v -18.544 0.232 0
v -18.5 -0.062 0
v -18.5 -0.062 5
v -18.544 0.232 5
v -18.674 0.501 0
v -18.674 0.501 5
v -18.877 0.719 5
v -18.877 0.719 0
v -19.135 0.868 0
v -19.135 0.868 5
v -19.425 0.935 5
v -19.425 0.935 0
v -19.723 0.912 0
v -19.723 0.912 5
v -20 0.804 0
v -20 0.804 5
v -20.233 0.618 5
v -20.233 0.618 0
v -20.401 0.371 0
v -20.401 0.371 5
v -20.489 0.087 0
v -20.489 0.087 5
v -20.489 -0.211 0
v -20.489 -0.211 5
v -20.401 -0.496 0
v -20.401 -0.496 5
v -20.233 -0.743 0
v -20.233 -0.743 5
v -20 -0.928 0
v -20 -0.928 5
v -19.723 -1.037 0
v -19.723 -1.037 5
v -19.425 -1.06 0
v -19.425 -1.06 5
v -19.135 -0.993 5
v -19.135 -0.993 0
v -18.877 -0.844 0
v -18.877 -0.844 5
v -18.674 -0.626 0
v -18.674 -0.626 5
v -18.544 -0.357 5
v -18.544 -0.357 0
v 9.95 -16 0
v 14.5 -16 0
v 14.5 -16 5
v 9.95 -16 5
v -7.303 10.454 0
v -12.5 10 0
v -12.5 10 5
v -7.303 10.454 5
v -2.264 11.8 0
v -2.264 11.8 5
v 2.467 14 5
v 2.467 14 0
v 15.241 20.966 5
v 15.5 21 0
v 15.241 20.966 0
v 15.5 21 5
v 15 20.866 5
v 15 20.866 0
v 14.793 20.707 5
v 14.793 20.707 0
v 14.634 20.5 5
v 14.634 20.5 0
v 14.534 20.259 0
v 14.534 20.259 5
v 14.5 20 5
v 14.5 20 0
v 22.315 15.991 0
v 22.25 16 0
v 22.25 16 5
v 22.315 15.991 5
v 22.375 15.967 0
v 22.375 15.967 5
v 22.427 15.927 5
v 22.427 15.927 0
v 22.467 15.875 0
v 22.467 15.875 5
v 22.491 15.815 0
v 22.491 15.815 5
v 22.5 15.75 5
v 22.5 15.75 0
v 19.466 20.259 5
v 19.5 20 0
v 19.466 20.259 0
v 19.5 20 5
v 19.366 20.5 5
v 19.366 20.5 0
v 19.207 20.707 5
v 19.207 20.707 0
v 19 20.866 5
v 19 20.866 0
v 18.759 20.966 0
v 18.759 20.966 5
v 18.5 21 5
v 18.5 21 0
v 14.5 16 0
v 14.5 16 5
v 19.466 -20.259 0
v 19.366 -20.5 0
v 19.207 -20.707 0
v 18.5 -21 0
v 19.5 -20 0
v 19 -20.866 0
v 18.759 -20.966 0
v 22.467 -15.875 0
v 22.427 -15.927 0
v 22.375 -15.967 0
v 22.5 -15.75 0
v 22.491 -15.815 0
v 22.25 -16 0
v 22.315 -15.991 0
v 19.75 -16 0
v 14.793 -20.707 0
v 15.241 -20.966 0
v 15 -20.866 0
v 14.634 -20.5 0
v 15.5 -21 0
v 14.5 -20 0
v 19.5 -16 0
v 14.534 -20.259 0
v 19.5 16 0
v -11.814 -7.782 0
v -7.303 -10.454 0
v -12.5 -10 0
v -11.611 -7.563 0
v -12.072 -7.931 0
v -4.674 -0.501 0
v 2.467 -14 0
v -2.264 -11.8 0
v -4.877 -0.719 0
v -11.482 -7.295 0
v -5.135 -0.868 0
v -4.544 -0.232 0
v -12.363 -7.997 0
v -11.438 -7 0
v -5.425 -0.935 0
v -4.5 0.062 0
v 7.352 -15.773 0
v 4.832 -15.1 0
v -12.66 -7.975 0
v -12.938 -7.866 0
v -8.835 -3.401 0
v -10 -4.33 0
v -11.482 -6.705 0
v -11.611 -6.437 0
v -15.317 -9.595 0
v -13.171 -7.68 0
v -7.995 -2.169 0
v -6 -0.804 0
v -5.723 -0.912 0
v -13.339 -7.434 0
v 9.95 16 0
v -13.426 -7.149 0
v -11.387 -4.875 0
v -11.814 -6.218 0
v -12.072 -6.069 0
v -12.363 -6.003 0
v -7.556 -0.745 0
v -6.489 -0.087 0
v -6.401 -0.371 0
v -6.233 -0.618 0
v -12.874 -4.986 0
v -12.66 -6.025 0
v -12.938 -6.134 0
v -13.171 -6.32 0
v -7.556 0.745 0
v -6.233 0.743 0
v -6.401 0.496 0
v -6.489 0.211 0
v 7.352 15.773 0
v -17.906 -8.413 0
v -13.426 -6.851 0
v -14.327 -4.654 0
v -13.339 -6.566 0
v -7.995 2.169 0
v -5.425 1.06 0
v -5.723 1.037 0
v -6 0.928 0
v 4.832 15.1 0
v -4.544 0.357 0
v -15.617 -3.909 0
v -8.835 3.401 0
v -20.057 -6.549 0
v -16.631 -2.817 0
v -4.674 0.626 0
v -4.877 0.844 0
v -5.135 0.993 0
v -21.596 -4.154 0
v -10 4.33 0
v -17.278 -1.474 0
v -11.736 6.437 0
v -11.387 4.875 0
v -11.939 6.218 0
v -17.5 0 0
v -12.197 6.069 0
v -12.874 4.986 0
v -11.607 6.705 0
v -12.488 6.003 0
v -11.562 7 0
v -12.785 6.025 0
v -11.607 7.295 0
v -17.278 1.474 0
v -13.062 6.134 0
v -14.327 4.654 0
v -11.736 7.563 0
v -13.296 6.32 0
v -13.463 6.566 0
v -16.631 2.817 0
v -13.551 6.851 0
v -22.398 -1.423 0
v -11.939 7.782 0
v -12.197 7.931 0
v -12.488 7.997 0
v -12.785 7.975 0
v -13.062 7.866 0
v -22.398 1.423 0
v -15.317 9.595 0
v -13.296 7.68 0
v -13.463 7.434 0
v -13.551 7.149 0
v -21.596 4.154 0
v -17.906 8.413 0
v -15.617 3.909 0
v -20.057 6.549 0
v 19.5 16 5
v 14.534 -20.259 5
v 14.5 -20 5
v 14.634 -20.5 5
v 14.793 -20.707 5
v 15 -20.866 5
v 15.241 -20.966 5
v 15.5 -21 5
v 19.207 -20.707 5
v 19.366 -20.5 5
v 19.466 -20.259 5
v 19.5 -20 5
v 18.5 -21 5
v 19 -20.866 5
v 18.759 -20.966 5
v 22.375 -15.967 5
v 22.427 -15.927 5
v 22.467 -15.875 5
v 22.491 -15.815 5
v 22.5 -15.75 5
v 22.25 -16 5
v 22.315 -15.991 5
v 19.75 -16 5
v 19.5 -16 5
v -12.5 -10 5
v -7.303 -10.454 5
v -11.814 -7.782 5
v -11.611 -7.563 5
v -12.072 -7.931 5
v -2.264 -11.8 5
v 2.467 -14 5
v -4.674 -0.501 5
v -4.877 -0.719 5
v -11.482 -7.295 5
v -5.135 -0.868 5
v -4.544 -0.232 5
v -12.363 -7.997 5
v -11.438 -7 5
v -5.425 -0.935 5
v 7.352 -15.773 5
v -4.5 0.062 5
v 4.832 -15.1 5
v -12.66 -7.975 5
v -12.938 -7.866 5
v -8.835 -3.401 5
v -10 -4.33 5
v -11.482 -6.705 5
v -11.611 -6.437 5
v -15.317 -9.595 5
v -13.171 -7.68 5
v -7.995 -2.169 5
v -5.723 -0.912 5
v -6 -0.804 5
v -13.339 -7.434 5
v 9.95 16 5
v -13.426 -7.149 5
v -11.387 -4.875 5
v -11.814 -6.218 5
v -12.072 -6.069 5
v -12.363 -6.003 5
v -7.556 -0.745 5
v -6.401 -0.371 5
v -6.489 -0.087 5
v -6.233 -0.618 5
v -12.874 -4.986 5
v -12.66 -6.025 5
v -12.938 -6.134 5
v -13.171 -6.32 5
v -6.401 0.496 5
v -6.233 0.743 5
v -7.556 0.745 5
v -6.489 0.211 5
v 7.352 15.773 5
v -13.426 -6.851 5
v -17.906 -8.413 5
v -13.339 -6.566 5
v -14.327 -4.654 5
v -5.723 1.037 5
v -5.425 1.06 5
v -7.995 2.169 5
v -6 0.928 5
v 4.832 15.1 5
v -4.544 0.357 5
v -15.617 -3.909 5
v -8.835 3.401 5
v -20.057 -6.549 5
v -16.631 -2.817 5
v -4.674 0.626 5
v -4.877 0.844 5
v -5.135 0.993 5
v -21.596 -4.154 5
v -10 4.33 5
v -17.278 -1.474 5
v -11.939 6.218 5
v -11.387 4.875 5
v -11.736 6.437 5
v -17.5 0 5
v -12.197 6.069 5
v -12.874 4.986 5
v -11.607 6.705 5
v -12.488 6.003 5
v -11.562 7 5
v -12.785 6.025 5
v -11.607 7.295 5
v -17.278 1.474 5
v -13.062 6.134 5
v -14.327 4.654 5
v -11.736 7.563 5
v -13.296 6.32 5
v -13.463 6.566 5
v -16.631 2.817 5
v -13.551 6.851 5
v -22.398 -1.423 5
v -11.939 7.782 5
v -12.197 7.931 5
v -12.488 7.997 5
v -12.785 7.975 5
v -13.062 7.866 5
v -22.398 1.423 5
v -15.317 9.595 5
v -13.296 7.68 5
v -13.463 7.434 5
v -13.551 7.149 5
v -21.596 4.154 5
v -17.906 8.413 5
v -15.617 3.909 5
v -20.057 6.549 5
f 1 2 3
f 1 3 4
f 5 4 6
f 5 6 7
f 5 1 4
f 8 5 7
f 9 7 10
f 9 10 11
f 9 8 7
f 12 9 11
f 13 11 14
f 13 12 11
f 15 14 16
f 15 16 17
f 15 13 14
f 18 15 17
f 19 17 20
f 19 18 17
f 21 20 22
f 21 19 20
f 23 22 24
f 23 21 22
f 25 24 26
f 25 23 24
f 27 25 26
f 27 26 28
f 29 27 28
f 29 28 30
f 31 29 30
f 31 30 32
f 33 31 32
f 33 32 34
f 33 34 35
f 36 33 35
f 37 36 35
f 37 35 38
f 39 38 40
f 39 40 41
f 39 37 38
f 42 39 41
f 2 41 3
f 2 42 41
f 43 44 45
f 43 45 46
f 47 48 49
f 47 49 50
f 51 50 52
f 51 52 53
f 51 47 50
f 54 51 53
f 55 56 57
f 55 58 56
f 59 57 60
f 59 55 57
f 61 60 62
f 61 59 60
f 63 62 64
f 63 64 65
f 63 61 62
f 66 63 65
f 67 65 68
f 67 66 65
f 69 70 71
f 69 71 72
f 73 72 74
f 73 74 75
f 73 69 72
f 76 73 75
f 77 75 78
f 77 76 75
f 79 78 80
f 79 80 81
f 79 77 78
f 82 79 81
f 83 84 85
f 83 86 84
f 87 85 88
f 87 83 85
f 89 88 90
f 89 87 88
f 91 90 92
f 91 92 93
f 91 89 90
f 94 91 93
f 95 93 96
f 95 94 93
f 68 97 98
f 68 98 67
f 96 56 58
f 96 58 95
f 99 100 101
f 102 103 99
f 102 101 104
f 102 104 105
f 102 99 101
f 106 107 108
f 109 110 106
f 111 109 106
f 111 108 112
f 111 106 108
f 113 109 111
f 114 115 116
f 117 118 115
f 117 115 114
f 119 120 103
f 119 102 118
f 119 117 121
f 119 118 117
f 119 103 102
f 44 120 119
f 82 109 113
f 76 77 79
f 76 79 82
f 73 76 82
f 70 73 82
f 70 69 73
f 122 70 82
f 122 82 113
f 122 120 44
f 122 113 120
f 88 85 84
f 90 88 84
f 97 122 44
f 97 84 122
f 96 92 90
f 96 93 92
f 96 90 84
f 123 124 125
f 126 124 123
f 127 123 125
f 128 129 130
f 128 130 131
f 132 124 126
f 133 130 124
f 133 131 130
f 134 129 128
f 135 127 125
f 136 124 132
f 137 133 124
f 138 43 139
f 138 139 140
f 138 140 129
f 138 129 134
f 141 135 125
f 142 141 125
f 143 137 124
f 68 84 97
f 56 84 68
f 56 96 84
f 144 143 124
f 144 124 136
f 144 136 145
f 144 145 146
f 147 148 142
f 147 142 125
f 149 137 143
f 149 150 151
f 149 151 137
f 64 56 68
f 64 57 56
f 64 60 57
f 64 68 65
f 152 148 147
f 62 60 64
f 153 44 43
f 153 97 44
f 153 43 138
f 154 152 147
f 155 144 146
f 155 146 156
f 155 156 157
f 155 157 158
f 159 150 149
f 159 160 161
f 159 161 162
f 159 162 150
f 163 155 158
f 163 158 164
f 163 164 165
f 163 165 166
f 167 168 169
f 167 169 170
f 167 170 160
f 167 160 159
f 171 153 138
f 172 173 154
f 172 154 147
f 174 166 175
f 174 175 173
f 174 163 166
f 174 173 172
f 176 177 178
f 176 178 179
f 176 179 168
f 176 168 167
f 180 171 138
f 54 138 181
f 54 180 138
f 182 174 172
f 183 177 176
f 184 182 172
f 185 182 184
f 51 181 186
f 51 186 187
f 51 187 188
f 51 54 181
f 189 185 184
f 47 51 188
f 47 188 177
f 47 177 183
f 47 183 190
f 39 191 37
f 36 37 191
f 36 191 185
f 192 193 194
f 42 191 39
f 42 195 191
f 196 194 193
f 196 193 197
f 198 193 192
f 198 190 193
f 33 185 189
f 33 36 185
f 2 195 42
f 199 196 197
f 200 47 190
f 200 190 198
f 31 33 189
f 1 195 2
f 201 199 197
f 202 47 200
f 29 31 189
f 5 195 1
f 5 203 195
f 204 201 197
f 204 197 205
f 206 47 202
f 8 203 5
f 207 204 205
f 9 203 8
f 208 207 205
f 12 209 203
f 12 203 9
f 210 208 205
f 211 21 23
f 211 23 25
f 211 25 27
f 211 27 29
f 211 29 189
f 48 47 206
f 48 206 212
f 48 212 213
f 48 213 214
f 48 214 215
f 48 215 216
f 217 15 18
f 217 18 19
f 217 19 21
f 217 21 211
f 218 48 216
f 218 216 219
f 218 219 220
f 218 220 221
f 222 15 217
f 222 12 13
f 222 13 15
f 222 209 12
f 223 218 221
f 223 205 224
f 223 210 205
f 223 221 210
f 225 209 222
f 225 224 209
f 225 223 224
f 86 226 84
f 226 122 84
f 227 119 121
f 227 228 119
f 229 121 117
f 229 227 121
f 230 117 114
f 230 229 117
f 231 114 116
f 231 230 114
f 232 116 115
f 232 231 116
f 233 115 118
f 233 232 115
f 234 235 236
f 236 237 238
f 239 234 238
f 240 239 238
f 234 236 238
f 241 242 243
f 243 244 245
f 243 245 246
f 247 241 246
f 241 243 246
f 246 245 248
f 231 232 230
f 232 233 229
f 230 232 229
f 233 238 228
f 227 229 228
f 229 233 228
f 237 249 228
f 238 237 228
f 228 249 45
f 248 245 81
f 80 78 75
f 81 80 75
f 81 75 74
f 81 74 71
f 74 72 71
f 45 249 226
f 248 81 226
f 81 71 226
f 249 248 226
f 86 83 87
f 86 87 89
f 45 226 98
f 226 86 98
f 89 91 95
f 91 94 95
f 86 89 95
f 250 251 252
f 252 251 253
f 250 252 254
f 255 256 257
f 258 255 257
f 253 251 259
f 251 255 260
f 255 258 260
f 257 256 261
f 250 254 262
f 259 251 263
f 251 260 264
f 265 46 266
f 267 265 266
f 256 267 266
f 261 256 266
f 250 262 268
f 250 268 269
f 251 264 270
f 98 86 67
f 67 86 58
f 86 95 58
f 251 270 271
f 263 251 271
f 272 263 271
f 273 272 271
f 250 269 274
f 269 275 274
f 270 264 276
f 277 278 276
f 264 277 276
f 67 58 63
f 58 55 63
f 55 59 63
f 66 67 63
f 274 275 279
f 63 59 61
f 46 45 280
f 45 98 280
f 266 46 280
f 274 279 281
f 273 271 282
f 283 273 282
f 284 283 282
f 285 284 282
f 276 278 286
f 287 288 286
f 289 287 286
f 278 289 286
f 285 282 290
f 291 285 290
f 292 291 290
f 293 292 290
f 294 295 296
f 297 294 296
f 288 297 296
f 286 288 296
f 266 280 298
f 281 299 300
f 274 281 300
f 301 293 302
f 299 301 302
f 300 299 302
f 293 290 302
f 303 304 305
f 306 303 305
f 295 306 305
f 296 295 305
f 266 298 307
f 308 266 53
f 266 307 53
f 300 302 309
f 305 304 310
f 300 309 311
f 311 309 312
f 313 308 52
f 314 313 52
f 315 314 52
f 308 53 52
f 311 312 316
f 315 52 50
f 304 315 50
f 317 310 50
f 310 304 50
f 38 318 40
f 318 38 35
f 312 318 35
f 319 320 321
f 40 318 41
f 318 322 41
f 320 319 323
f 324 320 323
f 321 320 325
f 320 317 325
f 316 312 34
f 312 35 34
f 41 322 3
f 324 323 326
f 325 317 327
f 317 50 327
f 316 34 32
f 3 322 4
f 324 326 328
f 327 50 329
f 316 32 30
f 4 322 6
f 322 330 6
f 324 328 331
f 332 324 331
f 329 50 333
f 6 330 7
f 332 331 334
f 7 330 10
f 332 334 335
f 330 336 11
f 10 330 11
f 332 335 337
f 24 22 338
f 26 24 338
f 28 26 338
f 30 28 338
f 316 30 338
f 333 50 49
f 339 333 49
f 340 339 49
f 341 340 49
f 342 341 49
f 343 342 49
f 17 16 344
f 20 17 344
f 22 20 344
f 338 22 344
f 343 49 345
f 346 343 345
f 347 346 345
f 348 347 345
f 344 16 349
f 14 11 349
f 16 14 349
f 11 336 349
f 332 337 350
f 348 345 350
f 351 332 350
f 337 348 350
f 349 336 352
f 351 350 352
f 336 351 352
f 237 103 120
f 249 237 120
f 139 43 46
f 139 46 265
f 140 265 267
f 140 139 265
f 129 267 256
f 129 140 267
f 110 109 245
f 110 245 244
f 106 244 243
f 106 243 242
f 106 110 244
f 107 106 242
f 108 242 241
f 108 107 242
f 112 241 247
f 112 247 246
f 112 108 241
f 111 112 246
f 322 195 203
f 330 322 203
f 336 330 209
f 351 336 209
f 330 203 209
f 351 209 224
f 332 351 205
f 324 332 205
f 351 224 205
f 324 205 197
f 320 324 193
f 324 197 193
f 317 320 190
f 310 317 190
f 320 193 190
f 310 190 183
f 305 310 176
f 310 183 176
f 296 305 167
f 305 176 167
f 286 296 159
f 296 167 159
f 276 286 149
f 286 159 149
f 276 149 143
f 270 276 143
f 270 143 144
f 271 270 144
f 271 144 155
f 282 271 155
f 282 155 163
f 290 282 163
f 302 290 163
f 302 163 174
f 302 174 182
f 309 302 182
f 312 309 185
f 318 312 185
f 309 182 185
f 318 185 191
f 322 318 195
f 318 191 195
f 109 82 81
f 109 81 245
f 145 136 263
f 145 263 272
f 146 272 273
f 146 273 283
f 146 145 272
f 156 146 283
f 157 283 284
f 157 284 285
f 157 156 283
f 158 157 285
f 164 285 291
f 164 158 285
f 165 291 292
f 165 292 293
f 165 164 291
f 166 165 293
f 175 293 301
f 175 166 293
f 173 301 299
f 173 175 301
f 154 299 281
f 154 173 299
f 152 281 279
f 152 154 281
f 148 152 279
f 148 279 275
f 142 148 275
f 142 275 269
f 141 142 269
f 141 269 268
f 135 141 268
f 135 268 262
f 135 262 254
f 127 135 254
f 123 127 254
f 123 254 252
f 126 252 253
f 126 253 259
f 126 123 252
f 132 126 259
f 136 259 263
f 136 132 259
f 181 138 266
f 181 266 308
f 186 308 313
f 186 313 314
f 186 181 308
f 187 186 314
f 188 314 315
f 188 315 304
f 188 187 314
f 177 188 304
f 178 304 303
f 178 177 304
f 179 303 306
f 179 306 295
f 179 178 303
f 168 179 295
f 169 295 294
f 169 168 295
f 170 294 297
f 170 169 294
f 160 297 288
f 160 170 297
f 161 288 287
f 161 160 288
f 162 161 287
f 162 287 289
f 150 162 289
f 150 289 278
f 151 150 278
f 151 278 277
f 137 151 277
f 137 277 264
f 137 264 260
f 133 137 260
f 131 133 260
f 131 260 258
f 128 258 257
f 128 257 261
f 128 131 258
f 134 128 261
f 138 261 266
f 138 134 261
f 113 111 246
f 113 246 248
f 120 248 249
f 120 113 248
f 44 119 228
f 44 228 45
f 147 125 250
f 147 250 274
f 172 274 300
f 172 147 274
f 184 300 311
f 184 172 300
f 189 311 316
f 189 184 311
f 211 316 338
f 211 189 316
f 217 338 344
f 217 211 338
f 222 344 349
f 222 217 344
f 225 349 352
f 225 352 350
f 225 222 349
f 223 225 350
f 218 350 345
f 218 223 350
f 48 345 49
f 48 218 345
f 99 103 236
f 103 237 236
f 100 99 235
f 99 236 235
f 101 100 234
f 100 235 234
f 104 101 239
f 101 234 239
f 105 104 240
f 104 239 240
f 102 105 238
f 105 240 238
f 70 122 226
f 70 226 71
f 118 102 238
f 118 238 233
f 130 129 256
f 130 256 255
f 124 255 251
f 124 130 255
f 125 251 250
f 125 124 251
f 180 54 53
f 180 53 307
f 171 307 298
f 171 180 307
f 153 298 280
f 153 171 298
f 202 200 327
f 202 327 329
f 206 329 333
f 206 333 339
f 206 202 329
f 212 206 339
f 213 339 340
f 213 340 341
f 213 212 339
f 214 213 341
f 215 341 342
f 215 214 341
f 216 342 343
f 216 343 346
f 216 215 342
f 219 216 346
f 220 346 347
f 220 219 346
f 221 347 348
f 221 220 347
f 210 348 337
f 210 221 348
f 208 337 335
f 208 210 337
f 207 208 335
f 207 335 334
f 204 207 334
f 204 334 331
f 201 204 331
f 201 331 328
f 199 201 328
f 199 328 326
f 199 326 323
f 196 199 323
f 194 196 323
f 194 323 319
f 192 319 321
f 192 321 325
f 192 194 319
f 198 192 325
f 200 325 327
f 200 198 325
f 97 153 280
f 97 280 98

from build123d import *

# Parameters (mm, degrees)
SKETCH1_R           = 1
SKETCH1_R_2         = 1.5
BOSS_EXTRUDE1_DEPTH = 5
SKETCH2_R           = 5
CUT_EXTRUDE1_DEPTH  = 5
SKETCH3_W           = 1.4355807
SKETCH3_H           = 6.545274718
SKETCH3_W_2         = 3.269456696
SKETCH3_H_2         = 6.030331239
CUT_EXTRUDE2_DEPTH  = 5
SKETCH4_W           = 3.74989662
SKETCH4_H           = 42
BOSS_EXTRUDE2_DEPTH = 5
FILLET1_R           = 1


with BuildPart() as part:
    # Sketch1 → Boss-Extrude1 (new body)
    with BuildSketch(Plane.XY):
        with BuildLine():
            Line((19.25, -21), (14.5, -21))
            Line((14.5, -21), (14.5, -16))
            Line((14.5, -16), (13.407179423, -16))
            Line((13.407179423, -16), (9.949944321, -16))
            ThreePointArc((9.949944321, -16), (6.076960974, -15.491376746), (2.466629547, -14))
            ThreePointArc((2.466629547, -14), (-4.754033308, -11.017246508), (-12.5, -10))
            ThreePointArc((-12.5, -10), (-22.5, 0), (-12.5, 10))
            ThreePointArc((-12.5, 10), (-4.754033308, 11.017246508), (2.466629547, 14))
            ThreePointArc((2.466629547, 14), (6.076960974, 15.491376746), (9.949944321, 16))
            Line((9.949944321, 16), (13.407179423, 16))
            Line((13.407179423, 16), (14.5, 16))
            Line((14.5, 16), (14.5, 21))
            Line((14.5, 21), (19.25, 21))
            ThreePointArc((19.25, 21), (19.426776695, 20.926776695), (19.5, 20.75))
            Line((19.5, 20.75), (19.5, 16.25))
            ThreePointArc((19.5, 16.25), (19.573223305, 16.073223305), (19.75, 16))
            Line((19.75, 16), (22.25, 16))
            ThreePointArc((22.25, 16), (22.426776695, 15.926776695), (22.5, 15.75))
            Line((22.5, 15.75), (22.5, -15.75))
            ThreePointArc((22.5, -15.75), (22.426776695, -15.926776695), (22.25, -16))
            Line((22.25, -16), (19.75, -16))
            ThreePointArc((19.75, -16), (19.573223305, -16.073223305), (19.5, -16.25))
            Line((19.5, -16.25), (19.5, -20.75))
            ThreePointArc((19.5, -20.75), (19.426776695, -20.926776695), (19.25, -21))
        make_face()
        with Locations((-19.5, -0.062454575)):
            Circle(SKETCH1_R, mode=Mode.SUBTRACT)
        with Locations((-12.562454575, 7)):
            Circle(SKETCH1_R, mode=Mode.SUBTRACT)
        with Locations((-5.5, 0.062454575)):
            Circle(SKETCH1_R, mode=Mode.SUBTRACT)
        with Locations((-12.5, 0)):
            Circle(SKETCH1_R_2, mode=Mode.SUBTRACT)
        with Locations((-12.437545425, -7)):
            Circle(SKETCH1_R, mode=Mode.SUBTRACT)
    extrude(amount=BOSS_EXTRUDE1_DEPTH)

    # Sketch2 → Cut-Extrude1 (cut)
    with BuildSketch(Plane(origin=(0, 0, 0), x_dir=(-1, 0, 0), z_dir=(0, 0, -1))):
        with Locations((12.5, 0)):
            Circle(SKETCH2_R)
    extrude(amount=-CUT_EXTRUDE1_DEPTH, mode=Mode.SUBTRACT)

    # Sketch3 → Cut-Extrude2 (cut)
    with BuildSketch(Plane(origin=(0, 0, 0), x_dir=(-1, 0, 0), z_dir=(0, 0, -1))):
        with Locations((-20.21779035, 19.272637359)):
            Rectangle(SKETCH3_W, SKETCH3_H)
        with Locations((-21.134728348, -19.01516562)):
            Rectangle(SKETCH3_W_2, SKETCH3_H_2)
    extrude(amount=-CUT_EXTRUDE2_DEPTH, mode=Mode.SUBTRACT)

    # Sketch4 → Boss-Extrude2 (add)
    with BuildSketch(Plane(origin=(0, 0, 0), x_dir=(-1, 0, 0), z_dir=(0, 0, -1))):
        with Locations((-17.62505169, 0)):
            Rectangle(SKETCH4_W, SKETCH4_H)
    extrude(amount=-BOSS_EXTRUDE2_DEPTH)

    # Fillet1
    fillet1_edges = [part.edges().sort_by_distance(p)[0] for p in [
        (19.5, -21, 2.5),
        (19.5, 21, 2.5),
        (14.5, 21, 2.5),
        (14.5, -21, 2.5),
    ]]
    fillet(fillet1_edges, radius=FILLET1_R)


solid = part.part
